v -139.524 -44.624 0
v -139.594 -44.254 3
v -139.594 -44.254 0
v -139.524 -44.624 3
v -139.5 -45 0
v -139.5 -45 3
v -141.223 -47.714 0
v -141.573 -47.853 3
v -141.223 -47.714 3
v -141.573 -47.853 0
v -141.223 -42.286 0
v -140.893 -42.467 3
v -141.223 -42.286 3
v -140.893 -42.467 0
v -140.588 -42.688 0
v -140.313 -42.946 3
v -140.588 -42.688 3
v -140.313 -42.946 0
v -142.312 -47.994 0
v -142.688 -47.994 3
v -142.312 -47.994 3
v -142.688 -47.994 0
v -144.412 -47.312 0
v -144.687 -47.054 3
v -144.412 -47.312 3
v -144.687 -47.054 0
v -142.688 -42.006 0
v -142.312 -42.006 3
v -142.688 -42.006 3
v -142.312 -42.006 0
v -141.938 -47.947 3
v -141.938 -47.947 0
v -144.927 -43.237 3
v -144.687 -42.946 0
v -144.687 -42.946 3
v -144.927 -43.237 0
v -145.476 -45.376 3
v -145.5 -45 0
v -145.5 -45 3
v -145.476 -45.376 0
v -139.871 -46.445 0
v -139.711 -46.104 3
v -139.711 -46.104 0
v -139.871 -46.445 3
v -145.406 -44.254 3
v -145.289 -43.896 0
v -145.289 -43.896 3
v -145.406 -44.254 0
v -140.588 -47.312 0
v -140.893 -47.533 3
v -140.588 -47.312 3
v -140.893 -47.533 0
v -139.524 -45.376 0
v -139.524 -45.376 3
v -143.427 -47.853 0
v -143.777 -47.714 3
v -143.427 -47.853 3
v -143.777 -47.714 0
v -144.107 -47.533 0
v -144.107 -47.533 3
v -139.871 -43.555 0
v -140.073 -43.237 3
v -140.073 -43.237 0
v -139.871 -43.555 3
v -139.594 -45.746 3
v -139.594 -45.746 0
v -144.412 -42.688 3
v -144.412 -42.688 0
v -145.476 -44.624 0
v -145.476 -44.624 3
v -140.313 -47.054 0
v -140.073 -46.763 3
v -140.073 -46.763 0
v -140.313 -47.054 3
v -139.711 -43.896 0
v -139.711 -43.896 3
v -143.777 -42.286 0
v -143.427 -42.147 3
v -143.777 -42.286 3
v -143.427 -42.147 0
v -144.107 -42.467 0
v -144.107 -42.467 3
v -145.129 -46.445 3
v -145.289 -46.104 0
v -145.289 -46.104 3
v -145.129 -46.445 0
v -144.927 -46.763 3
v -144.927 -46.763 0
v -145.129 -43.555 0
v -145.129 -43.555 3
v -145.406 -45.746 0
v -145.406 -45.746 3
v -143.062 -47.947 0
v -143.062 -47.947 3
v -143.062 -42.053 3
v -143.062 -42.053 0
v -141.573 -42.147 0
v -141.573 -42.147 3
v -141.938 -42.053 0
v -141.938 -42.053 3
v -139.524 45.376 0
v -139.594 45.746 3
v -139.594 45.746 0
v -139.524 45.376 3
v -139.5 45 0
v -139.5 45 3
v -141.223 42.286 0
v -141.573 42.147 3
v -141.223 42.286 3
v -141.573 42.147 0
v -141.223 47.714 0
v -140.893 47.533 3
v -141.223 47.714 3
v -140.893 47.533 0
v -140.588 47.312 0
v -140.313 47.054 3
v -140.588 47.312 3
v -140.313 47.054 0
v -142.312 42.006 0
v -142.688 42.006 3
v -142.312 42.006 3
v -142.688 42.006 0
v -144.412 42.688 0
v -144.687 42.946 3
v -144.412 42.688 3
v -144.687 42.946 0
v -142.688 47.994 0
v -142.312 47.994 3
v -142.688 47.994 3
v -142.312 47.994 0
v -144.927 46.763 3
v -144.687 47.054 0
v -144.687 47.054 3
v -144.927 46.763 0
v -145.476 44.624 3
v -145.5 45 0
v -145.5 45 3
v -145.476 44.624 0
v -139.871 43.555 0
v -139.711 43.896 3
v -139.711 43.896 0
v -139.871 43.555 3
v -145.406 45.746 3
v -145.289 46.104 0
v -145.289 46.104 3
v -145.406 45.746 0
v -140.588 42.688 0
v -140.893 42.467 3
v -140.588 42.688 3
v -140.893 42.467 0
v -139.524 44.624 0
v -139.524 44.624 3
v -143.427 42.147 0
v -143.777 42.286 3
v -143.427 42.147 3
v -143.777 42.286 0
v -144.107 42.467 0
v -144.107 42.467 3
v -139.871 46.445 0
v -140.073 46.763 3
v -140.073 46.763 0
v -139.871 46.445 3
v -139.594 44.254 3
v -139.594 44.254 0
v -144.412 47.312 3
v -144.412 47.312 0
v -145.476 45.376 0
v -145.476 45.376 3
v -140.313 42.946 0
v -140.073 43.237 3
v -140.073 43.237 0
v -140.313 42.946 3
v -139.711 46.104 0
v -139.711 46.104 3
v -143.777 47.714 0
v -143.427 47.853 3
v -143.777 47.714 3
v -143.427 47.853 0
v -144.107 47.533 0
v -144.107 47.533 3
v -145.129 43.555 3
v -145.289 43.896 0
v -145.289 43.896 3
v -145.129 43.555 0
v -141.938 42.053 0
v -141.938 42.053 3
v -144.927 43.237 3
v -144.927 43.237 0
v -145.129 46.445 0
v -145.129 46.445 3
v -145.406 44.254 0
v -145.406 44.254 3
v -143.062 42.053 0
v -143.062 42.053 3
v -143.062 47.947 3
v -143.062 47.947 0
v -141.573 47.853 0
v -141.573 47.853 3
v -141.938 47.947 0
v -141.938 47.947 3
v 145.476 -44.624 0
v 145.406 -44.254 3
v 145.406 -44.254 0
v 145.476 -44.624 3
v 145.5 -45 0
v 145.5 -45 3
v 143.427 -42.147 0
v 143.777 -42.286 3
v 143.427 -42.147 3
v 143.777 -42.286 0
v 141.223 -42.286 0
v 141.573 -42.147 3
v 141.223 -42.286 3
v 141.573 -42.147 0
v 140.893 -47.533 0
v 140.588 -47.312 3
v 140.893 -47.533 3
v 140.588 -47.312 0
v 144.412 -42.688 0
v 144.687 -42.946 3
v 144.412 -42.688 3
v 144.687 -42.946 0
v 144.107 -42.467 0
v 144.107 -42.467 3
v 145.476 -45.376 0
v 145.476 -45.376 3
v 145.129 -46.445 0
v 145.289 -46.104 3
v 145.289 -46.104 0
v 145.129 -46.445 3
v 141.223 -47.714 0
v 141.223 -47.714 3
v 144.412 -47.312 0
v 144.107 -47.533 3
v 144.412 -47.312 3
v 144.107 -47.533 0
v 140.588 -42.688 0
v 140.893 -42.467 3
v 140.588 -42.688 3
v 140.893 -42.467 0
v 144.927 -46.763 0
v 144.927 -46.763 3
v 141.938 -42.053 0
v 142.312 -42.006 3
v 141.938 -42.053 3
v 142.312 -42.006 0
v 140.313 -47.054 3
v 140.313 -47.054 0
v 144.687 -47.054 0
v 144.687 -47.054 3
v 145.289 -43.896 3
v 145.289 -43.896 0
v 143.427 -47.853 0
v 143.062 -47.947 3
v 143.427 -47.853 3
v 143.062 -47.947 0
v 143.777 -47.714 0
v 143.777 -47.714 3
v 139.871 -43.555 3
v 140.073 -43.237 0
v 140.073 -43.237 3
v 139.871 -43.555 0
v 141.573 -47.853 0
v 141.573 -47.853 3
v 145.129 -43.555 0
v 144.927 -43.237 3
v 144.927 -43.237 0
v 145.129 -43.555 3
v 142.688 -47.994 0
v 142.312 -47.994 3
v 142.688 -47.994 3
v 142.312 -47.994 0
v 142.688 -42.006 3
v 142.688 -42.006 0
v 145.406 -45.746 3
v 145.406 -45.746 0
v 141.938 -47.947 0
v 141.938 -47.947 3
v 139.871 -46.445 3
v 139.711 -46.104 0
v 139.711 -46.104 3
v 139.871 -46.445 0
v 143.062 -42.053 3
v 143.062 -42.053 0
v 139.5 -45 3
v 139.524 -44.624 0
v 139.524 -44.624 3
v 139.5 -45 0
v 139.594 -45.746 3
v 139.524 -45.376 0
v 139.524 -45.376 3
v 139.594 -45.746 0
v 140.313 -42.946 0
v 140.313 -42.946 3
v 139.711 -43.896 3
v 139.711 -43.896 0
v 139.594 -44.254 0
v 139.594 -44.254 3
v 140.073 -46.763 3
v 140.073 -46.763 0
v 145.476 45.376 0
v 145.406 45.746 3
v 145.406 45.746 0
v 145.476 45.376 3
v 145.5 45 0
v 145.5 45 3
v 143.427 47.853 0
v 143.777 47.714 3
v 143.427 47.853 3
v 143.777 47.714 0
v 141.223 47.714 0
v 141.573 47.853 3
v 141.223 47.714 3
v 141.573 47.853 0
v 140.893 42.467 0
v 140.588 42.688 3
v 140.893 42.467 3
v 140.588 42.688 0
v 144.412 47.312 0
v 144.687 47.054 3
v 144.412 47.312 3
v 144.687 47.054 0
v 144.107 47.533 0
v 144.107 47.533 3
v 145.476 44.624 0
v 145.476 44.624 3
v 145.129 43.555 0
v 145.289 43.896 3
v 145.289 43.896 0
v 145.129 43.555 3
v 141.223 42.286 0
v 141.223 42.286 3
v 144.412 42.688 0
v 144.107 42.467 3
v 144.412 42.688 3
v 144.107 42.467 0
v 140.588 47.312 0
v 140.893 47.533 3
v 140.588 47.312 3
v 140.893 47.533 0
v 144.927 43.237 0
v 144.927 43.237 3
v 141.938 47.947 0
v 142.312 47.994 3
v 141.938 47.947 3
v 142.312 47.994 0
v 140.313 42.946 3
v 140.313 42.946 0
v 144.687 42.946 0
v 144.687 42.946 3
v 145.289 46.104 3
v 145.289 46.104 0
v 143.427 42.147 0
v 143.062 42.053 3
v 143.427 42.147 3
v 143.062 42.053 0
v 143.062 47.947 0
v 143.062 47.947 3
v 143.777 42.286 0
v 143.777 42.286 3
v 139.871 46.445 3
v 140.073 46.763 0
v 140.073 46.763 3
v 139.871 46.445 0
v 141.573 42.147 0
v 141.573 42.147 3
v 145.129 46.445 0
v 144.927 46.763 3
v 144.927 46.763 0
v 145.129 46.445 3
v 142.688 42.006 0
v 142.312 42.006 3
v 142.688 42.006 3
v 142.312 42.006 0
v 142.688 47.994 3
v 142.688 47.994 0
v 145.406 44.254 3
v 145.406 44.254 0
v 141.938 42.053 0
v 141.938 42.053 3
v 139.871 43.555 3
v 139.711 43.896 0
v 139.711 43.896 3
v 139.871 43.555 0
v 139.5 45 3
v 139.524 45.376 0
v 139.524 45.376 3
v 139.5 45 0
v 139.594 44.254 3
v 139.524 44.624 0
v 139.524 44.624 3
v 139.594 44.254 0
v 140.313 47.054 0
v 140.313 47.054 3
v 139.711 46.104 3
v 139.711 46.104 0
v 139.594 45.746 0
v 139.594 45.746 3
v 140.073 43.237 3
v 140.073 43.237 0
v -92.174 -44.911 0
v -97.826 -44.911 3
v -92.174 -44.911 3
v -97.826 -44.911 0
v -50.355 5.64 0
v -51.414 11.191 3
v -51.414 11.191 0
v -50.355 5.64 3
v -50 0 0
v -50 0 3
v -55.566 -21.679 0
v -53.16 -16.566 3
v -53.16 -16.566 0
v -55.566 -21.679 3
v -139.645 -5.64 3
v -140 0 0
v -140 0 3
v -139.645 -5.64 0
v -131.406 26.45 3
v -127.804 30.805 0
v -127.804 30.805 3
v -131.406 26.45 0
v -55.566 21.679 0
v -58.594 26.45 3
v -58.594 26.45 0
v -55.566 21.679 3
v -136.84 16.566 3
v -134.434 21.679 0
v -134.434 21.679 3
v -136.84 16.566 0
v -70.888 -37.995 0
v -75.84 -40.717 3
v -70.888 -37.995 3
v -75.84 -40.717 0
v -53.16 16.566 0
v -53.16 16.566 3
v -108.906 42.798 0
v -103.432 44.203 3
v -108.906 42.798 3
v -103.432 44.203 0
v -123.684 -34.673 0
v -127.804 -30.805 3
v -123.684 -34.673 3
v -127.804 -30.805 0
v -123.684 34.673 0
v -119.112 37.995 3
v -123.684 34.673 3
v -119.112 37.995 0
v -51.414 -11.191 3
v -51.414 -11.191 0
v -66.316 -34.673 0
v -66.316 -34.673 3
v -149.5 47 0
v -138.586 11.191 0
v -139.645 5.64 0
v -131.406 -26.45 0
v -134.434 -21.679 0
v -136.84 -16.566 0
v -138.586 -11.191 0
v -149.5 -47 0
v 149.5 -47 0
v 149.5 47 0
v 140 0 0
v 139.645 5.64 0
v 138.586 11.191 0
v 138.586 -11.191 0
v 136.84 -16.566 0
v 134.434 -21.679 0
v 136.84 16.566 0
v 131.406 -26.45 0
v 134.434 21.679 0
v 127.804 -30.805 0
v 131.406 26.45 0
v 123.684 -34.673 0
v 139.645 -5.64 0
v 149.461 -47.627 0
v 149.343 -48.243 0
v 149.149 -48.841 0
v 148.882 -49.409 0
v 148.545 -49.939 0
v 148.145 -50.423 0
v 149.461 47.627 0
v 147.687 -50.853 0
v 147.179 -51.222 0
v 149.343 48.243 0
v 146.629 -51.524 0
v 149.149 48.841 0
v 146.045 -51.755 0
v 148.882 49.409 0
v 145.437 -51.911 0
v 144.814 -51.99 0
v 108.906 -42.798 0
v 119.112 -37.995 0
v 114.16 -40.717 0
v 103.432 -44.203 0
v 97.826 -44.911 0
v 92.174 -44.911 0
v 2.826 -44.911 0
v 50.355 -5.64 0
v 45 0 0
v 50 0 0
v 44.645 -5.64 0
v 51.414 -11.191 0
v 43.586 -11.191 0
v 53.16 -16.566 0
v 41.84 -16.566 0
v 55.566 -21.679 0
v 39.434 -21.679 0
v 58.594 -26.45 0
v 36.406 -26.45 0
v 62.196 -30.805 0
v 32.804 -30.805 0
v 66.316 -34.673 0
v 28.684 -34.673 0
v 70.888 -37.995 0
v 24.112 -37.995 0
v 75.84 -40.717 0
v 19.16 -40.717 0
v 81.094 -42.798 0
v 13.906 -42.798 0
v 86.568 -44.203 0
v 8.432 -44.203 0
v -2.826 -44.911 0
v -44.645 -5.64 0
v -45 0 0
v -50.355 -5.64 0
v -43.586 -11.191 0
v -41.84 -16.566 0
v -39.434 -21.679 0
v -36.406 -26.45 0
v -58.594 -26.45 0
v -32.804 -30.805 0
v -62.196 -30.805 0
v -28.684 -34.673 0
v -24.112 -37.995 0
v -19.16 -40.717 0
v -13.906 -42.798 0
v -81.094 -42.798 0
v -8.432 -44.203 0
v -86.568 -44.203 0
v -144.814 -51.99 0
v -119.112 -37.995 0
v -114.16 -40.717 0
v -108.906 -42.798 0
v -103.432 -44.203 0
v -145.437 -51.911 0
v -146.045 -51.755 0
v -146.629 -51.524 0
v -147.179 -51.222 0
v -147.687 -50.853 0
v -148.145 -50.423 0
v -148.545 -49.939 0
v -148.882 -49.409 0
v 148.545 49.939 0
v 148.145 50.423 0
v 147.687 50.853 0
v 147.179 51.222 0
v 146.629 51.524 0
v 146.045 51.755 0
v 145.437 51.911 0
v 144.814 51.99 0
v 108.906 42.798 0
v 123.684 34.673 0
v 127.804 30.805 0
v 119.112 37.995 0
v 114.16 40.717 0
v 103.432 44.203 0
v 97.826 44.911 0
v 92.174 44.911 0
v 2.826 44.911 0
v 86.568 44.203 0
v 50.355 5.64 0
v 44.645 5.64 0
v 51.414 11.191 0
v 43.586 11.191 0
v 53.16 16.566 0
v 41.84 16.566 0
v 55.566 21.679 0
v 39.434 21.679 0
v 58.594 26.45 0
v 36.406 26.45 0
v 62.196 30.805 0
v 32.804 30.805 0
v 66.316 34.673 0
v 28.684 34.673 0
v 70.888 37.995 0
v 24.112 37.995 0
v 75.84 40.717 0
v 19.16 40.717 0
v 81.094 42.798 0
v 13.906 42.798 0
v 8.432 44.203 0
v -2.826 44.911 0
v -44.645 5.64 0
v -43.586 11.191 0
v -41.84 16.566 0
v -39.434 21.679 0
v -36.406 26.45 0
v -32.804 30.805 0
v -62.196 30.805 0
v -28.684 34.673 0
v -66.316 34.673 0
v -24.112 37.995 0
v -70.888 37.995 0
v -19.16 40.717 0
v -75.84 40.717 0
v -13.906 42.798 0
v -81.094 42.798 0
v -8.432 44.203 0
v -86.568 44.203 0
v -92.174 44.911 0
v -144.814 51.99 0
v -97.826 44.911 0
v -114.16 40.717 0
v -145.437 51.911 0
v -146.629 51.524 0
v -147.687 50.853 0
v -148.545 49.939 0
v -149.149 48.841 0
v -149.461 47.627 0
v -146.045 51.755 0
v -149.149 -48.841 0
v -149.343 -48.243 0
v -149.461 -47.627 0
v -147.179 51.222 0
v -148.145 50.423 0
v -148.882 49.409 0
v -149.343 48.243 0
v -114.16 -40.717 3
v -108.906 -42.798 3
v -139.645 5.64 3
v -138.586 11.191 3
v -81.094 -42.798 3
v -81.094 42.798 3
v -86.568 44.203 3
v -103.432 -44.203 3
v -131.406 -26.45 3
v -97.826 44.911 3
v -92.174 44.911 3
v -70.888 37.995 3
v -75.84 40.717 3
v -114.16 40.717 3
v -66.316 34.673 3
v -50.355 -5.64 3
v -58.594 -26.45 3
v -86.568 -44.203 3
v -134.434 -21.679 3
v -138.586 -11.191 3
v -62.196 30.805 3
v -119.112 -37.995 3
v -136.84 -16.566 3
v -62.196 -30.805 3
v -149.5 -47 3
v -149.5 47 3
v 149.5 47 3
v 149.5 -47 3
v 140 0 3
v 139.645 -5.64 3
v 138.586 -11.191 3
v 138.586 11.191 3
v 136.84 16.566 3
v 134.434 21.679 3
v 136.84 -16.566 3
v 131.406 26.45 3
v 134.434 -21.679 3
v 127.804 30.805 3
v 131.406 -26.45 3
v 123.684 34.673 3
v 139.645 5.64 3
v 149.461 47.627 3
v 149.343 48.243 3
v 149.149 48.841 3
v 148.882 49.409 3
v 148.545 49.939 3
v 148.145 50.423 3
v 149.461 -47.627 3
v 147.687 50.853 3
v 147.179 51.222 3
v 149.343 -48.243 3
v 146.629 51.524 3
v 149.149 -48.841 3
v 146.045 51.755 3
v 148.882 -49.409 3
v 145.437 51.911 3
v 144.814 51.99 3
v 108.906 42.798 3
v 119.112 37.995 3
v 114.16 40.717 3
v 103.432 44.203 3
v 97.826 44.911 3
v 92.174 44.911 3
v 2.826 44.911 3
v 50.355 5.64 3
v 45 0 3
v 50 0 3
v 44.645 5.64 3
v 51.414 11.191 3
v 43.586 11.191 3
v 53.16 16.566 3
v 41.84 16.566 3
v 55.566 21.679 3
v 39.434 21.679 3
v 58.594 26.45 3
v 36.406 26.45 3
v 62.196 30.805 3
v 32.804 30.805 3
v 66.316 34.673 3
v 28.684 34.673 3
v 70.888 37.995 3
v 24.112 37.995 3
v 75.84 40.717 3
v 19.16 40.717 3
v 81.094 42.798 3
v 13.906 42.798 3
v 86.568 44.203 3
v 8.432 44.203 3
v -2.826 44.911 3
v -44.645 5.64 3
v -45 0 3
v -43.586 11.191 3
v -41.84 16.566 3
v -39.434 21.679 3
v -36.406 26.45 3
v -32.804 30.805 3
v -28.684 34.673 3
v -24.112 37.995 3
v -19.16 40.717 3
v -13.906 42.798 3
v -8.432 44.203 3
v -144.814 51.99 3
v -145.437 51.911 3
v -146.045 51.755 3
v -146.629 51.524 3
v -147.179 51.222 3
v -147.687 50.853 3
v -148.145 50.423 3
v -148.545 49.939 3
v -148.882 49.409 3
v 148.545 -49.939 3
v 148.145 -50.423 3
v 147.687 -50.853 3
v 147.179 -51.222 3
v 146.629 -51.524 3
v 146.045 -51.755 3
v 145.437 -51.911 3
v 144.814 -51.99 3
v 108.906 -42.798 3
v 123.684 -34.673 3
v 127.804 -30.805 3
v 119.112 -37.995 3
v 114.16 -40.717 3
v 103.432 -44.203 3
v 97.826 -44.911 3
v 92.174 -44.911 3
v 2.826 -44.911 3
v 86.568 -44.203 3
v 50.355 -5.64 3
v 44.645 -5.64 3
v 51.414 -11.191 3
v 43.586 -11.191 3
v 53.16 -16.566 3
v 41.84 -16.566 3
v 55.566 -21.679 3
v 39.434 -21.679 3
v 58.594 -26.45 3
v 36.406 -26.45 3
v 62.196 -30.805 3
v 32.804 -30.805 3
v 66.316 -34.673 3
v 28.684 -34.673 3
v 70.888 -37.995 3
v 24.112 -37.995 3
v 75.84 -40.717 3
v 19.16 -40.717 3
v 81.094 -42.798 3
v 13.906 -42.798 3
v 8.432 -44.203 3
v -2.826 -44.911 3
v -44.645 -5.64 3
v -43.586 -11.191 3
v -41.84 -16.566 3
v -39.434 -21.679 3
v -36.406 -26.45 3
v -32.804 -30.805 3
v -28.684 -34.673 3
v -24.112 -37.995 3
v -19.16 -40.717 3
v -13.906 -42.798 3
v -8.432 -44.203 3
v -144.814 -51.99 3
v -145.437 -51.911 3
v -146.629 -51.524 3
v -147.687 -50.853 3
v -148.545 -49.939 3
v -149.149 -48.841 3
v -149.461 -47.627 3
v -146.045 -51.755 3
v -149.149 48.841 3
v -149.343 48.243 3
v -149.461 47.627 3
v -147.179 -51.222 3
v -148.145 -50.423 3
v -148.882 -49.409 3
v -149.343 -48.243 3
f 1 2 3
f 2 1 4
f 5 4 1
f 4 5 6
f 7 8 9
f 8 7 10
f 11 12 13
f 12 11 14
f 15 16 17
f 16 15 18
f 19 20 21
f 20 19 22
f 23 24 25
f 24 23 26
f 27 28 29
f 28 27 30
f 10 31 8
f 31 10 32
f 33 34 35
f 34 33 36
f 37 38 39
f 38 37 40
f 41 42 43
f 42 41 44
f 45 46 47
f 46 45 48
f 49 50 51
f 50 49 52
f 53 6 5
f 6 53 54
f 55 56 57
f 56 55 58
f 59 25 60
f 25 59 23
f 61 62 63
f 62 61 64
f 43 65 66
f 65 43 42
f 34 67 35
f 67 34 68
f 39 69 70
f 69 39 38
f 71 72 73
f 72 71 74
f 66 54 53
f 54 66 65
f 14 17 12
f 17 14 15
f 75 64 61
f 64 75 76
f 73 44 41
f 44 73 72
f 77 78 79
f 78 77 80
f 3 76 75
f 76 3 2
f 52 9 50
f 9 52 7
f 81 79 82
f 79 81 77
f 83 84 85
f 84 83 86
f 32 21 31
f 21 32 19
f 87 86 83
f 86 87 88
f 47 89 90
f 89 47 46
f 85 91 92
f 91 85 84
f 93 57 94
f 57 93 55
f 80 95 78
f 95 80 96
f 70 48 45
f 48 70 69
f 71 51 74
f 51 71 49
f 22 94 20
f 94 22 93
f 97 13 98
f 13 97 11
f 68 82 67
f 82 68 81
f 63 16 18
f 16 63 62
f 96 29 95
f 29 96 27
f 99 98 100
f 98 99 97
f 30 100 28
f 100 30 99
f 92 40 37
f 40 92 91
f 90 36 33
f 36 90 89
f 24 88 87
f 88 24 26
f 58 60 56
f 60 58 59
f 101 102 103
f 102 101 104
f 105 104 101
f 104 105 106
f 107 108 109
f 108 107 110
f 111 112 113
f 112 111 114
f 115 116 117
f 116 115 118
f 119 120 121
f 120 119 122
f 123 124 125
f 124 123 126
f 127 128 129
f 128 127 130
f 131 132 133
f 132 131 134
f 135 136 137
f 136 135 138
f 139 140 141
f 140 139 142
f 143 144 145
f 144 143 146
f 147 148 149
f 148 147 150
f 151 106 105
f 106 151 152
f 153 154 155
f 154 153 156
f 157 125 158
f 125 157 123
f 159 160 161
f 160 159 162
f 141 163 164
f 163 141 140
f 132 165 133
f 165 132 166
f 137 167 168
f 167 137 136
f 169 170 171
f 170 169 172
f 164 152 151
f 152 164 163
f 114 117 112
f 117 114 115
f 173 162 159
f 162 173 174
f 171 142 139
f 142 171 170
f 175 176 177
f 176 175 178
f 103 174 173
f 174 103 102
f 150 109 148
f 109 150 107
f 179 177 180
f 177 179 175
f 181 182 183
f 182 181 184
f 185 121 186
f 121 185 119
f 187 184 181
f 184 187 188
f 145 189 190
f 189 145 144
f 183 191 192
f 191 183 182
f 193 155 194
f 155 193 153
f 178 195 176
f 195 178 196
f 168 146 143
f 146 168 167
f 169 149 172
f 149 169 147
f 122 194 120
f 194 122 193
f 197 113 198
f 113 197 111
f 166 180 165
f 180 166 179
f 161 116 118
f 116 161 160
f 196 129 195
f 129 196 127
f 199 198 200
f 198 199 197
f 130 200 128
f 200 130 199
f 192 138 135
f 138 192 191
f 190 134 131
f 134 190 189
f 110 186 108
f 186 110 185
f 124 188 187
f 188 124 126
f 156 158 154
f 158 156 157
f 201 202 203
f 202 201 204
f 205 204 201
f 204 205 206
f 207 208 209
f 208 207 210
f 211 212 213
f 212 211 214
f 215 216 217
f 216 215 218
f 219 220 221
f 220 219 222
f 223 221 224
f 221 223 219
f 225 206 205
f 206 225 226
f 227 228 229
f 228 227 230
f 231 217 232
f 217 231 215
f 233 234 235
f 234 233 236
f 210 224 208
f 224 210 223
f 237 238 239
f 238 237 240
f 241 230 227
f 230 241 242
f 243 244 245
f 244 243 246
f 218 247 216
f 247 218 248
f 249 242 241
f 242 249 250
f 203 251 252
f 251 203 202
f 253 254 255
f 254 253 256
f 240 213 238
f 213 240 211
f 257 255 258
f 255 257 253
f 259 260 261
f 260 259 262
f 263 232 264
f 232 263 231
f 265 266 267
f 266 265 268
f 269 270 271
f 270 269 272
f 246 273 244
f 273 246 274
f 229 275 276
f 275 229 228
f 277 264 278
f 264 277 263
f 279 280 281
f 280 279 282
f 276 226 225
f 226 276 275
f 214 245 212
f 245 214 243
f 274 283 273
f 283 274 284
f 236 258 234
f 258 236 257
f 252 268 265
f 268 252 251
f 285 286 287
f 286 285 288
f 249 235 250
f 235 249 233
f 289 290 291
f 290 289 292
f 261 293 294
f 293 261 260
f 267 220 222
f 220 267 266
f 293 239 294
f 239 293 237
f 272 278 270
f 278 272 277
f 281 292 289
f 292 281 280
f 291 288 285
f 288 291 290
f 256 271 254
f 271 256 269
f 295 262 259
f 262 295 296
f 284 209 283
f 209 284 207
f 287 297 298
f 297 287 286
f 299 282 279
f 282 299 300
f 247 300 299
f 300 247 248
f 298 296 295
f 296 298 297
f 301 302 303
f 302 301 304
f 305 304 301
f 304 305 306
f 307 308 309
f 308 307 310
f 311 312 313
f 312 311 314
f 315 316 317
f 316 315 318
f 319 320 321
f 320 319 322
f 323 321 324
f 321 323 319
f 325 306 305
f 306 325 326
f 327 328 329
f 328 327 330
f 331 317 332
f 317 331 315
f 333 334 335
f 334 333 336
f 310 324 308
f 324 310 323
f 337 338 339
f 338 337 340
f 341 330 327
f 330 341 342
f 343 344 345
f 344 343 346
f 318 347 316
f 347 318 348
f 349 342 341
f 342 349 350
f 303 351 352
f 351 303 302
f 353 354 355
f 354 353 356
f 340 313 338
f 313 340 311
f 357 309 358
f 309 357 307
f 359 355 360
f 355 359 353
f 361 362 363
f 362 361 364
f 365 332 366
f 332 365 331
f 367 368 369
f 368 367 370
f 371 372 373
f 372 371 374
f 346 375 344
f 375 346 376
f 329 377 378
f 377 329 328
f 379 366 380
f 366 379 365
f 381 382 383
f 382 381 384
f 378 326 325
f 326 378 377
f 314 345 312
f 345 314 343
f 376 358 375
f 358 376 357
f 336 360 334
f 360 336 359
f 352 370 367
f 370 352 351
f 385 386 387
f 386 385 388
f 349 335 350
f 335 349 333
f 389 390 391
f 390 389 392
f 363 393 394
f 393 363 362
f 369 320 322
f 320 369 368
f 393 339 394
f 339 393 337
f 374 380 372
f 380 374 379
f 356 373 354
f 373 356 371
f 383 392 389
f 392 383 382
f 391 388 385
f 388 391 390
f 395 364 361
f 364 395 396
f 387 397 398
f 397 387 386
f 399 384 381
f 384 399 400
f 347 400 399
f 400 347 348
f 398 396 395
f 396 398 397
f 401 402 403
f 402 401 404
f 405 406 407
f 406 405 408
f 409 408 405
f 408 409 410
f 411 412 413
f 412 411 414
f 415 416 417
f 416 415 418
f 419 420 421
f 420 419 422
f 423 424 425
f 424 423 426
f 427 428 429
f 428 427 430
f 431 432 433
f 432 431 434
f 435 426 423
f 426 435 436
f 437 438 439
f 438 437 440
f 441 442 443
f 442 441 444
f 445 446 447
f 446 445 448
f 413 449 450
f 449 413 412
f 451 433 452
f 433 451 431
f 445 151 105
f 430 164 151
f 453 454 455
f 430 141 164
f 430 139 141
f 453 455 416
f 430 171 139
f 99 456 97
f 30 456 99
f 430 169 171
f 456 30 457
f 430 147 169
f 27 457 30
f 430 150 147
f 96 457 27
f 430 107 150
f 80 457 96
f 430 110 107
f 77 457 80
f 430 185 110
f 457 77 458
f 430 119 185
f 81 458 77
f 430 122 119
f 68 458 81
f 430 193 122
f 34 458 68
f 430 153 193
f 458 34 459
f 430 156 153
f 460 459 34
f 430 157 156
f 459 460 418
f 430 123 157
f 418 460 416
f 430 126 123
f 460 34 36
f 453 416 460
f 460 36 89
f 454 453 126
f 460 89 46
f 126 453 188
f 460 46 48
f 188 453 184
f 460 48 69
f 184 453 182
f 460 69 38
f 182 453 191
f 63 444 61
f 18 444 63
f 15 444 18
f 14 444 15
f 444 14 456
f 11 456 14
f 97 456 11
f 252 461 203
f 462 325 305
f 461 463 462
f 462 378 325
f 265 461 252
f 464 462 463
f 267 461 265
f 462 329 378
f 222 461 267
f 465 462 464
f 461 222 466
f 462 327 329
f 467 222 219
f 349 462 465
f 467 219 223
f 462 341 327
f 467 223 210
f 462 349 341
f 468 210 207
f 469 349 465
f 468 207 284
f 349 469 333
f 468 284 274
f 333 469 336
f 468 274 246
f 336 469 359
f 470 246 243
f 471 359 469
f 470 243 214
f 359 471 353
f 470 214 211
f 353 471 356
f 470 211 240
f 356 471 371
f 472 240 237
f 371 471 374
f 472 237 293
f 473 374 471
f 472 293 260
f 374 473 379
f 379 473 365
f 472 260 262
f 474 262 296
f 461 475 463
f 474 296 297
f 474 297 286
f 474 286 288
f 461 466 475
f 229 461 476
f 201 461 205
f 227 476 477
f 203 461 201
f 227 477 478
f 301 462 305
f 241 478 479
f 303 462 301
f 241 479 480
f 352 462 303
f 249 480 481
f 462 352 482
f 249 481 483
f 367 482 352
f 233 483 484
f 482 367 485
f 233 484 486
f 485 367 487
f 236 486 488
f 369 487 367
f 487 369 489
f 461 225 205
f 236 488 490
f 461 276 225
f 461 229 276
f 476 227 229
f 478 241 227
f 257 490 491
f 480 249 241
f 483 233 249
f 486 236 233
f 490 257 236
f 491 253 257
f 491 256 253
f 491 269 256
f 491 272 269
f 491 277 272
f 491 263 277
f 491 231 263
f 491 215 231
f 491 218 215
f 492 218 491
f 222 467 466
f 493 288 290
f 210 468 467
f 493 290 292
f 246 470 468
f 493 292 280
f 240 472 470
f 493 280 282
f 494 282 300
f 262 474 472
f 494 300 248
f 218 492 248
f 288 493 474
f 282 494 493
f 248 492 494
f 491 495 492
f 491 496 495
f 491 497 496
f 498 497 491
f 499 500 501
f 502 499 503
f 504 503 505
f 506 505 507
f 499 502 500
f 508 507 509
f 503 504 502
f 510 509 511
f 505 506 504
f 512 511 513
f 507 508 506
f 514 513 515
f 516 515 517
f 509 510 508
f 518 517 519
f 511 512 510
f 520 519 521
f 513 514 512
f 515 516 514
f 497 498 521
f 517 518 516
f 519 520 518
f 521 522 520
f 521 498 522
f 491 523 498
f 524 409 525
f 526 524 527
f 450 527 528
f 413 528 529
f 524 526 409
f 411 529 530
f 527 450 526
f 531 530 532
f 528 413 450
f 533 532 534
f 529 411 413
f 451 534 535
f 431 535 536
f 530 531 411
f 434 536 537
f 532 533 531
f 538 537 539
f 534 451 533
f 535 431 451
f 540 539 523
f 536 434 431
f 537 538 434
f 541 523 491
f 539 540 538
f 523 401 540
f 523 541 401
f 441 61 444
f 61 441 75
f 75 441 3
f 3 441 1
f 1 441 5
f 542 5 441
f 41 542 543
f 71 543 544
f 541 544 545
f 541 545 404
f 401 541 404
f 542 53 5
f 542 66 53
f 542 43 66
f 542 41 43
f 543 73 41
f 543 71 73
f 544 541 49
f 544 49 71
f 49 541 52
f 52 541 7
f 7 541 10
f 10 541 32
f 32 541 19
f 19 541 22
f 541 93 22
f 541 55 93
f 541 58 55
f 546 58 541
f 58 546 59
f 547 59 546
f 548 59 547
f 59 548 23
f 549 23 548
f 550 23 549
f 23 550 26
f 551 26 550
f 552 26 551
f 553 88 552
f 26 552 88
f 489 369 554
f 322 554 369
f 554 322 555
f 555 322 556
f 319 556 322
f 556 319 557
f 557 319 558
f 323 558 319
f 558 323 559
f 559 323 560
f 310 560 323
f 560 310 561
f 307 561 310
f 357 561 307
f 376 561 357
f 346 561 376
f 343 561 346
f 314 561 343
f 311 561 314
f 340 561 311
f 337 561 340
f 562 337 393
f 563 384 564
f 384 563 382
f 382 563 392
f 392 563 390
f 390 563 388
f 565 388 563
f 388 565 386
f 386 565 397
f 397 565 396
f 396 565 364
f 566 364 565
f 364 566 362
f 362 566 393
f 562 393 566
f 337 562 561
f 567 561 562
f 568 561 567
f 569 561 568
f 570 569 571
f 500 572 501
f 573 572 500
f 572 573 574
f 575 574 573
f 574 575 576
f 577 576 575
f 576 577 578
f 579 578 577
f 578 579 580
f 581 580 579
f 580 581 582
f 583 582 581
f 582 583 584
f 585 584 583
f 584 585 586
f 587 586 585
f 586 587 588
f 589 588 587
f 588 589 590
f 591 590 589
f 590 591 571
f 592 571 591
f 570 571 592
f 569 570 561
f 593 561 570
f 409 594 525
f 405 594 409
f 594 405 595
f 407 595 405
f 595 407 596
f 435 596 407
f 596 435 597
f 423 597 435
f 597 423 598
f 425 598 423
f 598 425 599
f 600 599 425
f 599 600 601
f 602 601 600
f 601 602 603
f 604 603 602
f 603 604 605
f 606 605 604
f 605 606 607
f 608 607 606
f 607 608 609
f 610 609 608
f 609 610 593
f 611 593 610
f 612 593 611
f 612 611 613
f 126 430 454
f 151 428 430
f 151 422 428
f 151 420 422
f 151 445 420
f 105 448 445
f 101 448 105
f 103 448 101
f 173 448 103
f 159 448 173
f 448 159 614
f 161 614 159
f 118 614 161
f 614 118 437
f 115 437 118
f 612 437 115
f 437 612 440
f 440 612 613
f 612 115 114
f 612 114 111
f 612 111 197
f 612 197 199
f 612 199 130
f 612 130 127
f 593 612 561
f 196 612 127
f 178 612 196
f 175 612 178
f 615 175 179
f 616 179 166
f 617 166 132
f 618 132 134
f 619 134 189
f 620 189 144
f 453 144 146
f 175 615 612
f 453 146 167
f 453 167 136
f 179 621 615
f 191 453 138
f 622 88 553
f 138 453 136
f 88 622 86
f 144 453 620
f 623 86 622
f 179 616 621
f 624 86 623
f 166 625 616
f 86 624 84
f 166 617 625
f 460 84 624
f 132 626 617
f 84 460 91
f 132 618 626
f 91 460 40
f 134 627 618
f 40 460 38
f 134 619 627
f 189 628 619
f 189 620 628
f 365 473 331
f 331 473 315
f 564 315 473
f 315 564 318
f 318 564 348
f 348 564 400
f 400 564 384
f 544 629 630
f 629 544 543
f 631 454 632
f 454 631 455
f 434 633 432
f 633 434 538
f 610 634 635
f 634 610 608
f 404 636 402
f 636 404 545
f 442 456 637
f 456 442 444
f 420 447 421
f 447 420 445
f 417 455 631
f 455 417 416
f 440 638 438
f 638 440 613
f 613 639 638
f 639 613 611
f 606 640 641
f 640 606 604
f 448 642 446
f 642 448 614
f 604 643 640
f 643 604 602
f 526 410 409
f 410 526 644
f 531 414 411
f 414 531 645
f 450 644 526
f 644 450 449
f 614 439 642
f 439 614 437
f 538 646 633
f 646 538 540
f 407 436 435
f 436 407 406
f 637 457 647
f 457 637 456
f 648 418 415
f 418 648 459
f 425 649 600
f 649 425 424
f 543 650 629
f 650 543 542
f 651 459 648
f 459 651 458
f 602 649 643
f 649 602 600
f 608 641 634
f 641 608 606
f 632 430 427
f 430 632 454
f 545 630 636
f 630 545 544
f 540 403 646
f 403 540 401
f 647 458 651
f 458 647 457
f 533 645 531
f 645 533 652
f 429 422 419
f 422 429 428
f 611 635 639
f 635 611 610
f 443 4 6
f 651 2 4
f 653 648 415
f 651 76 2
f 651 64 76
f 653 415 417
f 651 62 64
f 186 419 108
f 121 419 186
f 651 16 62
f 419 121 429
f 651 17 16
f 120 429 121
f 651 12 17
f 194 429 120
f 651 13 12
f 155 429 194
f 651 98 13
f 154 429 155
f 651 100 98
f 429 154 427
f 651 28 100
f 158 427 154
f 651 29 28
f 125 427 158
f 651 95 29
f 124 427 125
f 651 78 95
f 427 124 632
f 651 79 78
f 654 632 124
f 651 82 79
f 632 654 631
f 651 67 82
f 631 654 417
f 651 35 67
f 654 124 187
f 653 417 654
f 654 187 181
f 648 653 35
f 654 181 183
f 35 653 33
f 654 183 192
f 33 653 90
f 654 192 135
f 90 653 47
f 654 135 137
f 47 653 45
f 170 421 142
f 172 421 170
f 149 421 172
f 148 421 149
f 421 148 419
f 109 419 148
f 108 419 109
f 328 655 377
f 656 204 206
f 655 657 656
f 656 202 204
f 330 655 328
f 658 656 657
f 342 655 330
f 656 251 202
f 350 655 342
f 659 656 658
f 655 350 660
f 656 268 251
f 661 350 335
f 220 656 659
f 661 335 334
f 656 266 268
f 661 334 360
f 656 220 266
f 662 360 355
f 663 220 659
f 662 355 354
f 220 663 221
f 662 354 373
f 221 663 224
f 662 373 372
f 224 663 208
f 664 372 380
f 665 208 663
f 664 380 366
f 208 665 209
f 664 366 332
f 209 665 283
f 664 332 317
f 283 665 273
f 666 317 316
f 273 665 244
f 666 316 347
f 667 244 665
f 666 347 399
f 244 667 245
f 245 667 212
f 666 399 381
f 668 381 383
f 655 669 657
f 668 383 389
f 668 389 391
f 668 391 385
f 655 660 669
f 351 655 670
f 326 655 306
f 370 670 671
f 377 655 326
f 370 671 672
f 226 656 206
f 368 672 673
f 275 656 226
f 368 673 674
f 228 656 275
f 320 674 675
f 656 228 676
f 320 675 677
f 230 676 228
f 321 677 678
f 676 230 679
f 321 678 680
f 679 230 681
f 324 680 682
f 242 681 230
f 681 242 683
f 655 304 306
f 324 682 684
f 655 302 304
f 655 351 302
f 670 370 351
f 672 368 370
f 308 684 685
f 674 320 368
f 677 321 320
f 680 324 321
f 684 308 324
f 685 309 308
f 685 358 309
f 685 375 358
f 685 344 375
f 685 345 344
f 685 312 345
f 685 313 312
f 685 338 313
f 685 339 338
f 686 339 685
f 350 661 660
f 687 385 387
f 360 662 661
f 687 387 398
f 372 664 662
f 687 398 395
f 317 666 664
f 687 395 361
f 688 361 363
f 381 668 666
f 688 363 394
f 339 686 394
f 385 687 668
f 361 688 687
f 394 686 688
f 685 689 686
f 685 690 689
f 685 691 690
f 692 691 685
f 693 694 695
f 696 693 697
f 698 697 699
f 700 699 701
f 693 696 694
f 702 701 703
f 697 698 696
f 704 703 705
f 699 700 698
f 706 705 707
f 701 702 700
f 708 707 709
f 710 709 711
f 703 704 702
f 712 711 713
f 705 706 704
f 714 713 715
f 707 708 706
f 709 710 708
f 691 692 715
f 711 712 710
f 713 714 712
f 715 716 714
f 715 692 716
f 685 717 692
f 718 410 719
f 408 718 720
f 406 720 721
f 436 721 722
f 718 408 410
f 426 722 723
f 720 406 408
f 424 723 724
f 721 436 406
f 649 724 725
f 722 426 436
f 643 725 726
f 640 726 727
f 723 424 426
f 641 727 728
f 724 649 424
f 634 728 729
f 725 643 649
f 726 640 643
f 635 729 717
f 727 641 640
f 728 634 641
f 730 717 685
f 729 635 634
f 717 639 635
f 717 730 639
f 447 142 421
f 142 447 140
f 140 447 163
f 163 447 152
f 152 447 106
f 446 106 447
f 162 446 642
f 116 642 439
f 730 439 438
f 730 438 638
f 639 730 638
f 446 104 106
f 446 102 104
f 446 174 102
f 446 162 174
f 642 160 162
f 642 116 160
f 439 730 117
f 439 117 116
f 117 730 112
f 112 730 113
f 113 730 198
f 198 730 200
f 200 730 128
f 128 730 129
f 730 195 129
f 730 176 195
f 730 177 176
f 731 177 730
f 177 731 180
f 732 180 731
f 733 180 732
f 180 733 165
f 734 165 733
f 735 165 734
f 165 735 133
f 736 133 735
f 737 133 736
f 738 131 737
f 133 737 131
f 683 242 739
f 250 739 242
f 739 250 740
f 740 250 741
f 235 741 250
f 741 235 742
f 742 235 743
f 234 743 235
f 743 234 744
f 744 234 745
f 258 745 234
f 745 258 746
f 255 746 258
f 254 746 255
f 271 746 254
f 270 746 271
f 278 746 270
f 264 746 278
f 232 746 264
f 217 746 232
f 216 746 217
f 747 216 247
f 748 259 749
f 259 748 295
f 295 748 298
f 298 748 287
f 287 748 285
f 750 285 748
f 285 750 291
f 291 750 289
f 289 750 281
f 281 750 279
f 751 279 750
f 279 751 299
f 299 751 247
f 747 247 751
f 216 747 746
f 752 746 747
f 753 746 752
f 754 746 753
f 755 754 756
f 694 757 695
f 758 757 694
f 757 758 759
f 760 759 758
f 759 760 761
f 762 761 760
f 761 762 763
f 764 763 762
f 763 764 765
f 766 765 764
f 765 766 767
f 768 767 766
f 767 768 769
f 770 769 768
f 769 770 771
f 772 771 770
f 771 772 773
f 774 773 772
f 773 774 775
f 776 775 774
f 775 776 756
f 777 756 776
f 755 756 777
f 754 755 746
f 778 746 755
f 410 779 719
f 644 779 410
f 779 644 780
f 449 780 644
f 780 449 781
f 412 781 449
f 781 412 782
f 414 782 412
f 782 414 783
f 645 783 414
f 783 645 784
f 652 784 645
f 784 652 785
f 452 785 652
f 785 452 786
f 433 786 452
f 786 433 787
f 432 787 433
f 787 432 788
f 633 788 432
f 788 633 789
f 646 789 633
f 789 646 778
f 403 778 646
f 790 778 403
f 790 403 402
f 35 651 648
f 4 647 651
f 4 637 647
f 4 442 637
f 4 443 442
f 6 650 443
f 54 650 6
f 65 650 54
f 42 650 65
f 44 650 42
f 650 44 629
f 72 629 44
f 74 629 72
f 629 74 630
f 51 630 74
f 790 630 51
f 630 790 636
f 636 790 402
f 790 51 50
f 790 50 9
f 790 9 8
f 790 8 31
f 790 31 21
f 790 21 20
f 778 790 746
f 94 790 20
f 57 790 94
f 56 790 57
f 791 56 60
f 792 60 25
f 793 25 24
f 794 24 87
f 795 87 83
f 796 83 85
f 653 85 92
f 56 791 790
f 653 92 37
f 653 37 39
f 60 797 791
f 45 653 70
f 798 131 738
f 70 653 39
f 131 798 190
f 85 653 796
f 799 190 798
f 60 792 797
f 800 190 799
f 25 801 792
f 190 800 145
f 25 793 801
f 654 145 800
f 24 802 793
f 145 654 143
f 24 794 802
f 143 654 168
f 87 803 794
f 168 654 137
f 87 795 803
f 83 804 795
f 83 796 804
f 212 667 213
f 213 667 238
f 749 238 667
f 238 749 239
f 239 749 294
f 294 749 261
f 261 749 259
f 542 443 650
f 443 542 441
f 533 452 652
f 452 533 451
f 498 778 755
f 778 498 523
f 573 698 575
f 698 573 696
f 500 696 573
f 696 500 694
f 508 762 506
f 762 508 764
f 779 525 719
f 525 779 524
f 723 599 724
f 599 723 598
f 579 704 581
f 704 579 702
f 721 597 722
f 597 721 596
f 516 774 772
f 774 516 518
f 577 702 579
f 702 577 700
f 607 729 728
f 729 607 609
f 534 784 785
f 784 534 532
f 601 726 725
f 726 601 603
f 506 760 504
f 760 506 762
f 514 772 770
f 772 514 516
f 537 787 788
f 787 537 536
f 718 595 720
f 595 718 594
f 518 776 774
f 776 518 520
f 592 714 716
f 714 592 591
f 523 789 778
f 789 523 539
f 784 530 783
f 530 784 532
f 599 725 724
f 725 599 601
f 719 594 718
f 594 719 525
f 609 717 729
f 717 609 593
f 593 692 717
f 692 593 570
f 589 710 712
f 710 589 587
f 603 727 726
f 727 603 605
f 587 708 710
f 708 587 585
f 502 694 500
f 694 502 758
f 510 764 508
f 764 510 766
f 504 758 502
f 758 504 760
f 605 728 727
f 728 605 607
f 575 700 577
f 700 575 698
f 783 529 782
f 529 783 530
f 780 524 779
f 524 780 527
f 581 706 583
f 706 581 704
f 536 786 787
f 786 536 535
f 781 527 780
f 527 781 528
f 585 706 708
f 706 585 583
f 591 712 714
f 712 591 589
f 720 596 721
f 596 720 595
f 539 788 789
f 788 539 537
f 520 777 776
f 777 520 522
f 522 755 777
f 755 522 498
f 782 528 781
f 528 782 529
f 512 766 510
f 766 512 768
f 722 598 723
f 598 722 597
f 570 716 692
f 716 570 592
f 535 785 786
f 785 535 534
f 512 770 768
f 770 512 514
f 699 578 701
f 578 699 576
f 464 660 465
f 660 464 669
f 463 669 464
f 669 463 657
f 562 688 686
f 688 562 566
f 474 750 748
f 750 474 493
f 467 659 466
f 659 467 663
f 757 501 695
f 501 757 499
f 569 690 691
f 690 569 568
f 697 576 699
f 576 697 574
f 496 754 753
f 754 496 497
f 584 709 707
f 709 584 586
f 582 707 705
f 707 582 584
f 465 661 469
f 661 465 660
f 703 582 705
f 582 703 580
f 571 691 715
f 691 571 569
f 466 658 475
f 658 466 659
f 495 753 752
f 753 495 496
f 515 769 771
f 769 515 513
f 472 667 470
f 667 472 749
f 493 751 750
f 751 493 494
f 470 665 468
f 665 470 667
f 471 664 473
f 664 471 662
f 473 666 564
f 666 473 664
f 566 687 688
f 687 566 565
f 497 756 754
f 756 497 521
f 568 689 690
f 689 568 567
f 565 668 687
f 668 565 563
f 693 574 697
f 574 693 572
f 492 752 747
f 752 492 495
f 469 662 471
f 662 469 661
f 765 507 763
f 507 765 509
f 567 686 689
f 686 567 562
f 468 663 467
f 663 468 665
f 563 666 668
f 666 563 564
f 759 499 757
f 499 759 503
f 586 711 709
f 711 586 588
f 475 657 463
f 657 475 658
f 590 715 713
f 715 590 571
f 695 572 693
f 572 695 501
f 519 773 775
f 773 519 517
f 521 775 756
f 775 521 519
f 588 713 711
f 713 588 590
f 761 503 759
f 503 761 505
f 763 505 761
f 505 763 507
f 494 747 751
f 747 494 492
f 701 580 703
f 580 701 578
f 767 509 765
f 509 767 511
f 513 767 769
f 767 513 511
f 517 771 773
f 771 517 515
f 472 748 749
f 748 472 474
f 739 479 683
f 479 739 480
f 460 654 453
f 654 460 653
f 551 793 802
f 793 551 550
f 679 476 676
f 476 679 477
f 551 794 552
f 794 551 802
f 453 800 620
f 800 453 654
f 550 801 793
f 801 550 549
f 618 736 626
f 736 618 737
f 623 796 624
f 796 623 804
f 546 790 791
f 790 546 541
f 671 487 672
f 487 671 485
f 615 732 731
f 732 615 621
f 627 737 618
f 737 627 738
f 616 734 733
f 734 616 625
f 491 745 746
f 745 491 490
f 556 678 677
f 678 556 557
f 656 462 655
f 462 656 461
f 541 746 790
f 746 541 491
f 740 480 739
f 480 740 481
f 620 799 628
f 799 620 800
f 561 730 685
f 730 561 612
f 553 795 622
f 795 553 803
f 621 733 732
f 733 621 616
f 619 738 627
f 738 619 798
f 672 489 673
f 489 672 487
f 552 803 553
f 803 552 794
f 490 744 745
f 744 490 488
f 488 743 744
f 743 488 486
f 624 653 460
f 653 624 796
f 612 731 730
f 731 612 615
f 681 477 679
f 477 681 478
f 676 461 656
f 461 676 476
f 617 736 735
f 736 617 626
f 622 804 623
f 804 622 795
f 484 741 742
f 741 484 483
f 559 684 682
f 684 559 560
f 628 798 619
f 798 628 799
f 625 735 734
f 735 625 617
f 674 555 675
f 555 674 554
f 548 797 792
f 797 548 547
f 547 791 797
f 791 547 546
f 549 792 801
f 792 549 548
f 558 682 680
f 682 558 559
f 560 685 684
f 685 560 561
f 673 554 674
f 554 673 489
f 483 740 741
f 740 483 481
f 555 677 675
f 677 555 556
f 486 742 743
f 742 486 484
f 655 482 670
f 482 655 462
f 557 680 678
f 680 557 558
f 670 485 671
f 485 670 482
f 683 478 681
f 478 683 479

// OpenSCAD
$fn = 50;


difference() {
	union() {
		hull() {
			translate(v = [-144.5000000000, 47.0000000000, 0]) {
				cylinder(h = 3, r = 5);
			}
			translate(v = [144.5000000000, 47.0000000000, 0]) {
				cylinder(h = 3, r = 5);
			}
			translate(v = [-144.5000000000, -47.0000000000, 0]) {
				cylinder(h = 3, r = 5);
			}
			translate(v = [144.5000000000, -47.0000000000, 0]) {
				cylinder(h = 3, r = 5);
			}
		}
	}
	union() {
		#translate(v = [-142.5000000000, -45.0000000000, -100.0000000000]) {
			cylinder(h = 200, r = 3.0000000000);
		}
		#translate(v = [-142.5000000000, 45.0000000000, -100.0000000000]) {
			cylinder(h = 200, r = 3.0000000000);
		}
		#translate(v = [142.5000000000, -45.0000000000, -100.0000000000]) {
			cylinder(h = 200, r = 3.0000000000);
		}
		#translate(v = [142.5000000000, 45.0000000000, -100.0000000000]) {
			cylinder(h = 200, r = 3.0000000000);
		}
		#translate(v = [-95.0000000000, 0, 0]) {
			cylinder(h = 3, r = 45.0000000000);
		}
		#cylinder(h = 3, r = 45.0000000000);
		#translate(v = [95.0000000000, 0, 0]) {
			cylinder(h = 3, r = 45.0000000000);
		}
	}
}
